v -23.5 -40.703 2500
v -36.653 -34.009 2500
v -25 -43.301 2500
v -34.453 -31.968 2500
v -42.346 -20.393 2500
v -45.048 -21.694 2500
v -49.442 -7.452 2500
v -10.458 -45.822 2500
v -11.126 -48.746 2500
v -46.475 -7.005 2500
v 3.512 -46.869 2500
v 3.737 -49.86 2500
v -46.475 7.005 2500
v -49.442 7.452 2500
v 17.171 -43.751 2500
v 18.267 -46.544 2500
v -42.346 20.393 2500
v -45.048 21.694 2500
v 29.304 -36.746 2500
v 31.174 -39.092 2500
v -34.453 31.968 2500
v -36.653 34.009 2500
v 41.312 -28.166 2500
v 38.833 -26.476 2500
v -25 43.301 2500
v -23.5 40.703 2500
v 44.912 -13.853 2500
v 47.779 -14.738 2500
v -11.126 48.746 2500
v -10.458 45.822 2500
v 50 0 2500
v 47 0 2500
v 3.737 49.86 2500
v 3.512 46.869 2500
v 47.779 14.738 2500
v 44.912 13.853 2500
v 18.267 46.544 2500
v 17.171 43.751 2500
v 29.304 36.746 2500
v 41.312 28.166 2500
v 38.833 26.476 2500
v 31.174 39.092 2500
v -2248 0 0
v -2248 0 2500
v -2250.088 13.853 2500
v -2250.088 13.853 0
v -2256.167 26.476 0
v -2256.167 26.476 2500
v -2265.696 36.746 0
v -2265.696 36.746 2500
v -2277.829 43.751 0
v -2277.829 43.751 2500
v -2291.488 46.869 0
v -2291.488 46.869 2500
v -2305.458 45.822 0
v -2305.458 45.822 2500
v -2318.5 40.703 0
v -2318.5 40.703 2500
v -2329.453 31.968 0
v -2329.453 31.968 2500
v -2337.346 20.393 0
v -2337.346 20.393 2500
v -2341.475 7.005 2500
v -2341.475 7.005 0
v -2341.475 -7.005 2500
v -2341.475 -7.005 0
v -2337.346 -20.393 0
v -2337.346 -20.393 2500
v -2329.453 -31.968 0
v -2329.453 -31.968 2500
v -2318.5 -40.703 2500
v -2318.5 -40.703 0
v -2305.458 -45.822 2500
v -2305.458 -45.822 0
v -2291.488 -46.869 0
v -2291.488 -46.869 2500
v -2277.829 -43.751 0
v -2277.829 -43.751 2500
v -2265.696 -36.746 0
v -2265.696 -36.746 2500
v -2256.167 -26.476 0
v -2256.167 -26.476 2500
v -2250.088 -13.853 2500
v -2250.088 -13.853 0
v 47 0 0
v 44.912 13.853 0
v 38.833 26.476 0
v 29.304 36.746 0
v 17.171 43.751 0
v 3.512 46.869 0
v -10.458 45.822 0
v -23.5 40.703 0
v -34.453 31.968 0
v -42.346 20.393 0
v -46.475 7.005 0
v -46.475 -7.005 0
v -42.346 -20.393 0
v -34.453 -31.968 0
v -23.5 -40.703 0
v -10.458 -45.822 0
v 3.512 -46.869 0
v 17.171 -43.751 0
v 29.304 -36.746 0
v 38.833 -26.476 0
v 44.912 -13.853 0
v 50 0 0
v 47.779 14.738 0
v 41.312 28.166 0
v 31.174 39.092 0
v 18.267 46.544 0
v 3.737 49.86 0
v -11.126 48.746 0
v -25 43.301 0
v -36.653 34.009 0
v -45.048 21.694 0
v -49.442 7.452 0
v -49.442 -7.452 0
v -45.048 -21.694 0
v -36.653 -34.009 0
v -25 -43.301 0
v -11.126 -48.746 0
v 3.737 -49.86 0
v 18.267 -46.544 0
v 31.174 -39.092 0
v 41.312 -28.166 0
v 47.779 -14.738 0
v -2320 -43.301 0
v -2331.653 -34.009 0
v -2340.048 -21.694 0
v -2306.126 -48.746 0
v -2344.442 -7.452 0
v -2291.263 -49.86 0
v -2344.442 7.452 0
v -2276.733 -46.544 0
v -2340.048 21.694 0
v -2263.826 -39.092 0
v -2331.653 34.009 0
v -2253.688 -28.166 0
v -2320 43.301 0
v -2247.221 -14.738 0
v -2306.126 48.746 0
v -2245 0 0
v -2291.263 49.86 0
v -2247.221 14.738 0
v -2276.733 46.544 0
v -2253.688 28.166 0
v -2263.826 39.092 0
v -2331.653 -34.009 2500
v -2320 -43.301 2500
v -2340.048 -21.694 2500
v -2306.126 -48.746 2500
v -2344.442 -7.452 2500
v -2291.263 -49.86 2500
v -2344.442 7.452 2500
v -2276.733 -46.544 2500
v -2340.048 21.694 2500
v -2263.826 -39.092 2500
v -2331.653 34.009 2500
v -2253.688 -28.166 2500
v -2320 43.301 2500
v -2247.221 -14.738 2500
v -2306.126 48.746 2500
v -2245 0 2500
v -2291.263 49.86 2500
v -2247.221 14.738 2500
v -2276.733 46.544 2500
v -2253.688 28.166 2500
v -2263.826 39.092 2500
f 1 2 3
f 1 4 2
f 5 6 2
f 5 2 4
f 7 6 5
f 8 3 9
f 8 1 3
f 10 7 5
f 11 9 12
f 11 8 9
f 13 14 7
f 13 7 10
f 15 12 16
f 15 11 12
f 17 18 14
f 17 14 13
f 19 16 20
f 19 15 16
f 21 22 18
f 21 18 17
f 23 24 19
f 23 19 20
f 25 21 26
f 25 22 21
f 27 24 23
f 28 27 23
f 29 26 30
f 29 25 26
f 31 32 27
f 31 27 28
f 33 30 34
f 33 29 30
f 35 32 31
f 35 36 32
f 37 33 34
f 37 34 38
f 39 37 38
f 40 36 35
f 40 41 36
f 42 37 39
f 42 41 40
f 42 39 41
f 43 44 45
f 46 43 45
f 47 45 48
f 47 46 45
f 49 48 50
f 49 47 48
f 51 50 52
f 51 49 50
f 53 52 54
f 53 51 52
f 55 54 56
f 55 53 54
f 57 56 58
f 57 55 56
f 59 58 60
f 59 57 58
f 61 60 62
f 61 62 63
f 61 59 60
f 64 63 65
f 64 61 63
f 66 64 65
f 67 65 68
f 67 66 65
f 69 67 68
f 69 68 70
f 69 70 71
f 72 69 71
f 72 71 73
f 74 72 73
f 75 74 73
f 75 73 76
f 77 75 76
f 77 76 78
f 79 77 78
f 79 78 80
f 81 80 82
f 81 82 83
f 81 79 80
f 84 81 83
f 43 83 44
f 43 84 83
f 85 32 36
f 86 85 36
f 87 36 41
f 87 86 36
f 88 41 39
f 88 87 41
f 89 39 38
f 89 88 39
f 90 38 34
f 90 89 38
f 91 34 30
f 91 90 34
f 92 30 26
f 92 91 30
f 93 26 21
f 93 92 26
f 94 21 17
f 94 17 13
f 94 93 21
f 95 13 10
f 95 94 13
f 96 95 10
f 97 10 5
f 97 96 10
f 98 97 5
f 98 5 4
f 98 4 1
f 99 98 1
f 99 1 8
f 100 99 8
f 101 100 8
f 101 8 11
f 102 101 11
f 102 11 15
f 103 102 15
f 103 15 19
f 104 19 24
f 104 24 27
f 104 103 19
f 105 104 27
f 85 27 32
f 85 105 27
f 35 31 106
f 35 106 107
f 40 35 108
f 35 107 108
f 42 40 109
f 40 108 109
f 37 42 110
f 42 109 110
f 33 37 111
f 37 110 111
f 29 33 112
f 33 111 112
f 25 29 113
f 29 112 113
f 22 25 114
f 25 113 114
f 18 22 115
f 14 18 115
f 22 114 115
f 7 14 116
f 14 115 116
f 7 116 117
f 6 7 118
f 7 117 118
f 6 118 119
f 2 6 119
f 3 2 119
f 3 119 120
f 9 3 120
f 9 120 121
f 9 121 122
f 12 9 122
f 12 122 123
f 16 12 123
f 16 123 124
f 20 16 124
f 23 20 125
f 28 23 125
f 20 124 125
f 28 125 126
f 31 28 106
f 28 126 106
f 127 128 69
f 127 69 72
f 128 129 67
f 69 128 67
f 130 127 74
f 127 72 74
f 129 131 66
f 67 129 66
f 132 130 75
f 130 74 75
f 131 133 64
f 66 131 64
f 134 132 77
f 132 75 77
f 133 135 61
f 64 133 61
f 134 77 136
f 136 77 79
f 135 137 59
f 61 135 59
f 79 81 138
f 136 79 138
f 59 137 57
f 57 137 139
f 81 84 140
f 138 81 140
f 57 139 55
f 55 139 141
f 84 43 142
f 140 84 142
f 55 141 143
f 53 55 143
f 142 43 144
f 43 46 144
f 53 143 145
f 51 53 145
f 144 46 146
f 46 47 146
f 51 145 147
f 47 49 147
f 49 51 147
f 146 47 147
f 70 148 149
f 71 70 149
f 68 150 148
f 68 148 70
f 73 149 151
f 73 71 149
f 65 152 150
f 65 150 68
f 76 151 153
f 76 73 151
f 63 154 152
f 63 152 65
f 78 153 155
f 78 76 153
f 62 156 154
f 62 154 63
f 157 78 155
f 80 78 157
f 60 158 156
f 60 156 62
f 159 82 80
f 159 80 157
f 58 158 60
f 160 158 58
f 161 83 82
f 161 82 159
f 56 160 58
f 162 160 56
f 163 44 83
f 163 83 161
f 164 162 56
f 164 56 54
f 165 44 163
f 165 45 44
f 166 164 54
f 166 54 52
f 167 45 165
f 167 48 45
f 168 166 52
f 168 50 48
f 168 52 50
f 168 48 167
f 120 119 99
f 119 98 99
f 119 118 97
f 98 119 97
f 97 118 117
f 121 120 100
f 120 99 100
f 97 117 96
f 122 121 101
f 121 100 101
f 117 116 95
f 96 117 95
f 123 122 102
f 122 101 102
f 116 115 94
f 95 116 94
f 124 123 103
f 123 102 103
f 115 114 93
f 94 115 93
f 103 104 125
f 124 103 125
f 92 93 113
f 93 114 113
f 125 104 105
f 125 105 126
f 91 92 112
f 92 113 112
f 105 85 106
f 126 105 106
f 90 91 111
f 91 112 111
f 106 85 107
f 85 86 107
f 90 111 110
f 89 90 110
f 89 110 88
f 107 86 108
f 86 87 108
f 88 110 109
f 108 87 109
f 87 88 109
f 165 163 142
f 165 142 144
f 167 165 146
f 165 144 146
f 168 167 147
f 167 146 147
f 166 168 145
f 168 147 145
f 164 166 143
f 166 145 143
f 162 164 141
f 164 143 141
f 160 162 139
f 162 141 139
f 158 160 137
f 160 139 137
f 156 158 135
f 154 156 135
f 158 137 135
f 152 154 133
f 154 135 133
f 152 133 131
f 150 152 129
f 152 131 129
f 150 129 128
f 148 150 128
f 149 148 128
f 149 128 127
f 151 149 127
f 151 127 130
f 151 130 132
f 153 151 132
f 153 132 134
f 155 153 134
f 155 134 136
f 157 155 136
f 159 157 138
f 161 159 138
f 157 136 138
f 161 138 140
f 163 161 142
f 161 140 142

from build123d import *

# Parameters (mm, degrees)
SKETCH1_R             = 50
SKETCH1_R_2           = 47
EXTRUDE_THIN1_DEPTH   = 2500
EXTRUDE_THIN1_2_DEPTH = 2500


with BuildPart() as part:
    # Sketch1 → Extrude-Thin1 (new body)
    with BuildSketch(Plane.XY):
        Circle(SKETCH1_R)
        Circle(SKETCH1_R_2, mode=Mode.SUBTRACT)
    extrude(amount=EXTRUDE_THIN1_DEPTH)


with BuildPart() as body_2:
    # Sketch1 → Extrude-Thin1 2 (new body)
    with BuildSketch(Plane.XY):
        with Locations((-2295, 0)):
            Circle(SKETCH1_R)
        with Locations((-2295, 0)):
            Circle(SKETCH1_R_2, mode=Mode.SUBTRACT)
    extrude(amount=EXTRUDE_THIN1_2_DEPTH)


solid = Compound([part.part, body_2.part])
